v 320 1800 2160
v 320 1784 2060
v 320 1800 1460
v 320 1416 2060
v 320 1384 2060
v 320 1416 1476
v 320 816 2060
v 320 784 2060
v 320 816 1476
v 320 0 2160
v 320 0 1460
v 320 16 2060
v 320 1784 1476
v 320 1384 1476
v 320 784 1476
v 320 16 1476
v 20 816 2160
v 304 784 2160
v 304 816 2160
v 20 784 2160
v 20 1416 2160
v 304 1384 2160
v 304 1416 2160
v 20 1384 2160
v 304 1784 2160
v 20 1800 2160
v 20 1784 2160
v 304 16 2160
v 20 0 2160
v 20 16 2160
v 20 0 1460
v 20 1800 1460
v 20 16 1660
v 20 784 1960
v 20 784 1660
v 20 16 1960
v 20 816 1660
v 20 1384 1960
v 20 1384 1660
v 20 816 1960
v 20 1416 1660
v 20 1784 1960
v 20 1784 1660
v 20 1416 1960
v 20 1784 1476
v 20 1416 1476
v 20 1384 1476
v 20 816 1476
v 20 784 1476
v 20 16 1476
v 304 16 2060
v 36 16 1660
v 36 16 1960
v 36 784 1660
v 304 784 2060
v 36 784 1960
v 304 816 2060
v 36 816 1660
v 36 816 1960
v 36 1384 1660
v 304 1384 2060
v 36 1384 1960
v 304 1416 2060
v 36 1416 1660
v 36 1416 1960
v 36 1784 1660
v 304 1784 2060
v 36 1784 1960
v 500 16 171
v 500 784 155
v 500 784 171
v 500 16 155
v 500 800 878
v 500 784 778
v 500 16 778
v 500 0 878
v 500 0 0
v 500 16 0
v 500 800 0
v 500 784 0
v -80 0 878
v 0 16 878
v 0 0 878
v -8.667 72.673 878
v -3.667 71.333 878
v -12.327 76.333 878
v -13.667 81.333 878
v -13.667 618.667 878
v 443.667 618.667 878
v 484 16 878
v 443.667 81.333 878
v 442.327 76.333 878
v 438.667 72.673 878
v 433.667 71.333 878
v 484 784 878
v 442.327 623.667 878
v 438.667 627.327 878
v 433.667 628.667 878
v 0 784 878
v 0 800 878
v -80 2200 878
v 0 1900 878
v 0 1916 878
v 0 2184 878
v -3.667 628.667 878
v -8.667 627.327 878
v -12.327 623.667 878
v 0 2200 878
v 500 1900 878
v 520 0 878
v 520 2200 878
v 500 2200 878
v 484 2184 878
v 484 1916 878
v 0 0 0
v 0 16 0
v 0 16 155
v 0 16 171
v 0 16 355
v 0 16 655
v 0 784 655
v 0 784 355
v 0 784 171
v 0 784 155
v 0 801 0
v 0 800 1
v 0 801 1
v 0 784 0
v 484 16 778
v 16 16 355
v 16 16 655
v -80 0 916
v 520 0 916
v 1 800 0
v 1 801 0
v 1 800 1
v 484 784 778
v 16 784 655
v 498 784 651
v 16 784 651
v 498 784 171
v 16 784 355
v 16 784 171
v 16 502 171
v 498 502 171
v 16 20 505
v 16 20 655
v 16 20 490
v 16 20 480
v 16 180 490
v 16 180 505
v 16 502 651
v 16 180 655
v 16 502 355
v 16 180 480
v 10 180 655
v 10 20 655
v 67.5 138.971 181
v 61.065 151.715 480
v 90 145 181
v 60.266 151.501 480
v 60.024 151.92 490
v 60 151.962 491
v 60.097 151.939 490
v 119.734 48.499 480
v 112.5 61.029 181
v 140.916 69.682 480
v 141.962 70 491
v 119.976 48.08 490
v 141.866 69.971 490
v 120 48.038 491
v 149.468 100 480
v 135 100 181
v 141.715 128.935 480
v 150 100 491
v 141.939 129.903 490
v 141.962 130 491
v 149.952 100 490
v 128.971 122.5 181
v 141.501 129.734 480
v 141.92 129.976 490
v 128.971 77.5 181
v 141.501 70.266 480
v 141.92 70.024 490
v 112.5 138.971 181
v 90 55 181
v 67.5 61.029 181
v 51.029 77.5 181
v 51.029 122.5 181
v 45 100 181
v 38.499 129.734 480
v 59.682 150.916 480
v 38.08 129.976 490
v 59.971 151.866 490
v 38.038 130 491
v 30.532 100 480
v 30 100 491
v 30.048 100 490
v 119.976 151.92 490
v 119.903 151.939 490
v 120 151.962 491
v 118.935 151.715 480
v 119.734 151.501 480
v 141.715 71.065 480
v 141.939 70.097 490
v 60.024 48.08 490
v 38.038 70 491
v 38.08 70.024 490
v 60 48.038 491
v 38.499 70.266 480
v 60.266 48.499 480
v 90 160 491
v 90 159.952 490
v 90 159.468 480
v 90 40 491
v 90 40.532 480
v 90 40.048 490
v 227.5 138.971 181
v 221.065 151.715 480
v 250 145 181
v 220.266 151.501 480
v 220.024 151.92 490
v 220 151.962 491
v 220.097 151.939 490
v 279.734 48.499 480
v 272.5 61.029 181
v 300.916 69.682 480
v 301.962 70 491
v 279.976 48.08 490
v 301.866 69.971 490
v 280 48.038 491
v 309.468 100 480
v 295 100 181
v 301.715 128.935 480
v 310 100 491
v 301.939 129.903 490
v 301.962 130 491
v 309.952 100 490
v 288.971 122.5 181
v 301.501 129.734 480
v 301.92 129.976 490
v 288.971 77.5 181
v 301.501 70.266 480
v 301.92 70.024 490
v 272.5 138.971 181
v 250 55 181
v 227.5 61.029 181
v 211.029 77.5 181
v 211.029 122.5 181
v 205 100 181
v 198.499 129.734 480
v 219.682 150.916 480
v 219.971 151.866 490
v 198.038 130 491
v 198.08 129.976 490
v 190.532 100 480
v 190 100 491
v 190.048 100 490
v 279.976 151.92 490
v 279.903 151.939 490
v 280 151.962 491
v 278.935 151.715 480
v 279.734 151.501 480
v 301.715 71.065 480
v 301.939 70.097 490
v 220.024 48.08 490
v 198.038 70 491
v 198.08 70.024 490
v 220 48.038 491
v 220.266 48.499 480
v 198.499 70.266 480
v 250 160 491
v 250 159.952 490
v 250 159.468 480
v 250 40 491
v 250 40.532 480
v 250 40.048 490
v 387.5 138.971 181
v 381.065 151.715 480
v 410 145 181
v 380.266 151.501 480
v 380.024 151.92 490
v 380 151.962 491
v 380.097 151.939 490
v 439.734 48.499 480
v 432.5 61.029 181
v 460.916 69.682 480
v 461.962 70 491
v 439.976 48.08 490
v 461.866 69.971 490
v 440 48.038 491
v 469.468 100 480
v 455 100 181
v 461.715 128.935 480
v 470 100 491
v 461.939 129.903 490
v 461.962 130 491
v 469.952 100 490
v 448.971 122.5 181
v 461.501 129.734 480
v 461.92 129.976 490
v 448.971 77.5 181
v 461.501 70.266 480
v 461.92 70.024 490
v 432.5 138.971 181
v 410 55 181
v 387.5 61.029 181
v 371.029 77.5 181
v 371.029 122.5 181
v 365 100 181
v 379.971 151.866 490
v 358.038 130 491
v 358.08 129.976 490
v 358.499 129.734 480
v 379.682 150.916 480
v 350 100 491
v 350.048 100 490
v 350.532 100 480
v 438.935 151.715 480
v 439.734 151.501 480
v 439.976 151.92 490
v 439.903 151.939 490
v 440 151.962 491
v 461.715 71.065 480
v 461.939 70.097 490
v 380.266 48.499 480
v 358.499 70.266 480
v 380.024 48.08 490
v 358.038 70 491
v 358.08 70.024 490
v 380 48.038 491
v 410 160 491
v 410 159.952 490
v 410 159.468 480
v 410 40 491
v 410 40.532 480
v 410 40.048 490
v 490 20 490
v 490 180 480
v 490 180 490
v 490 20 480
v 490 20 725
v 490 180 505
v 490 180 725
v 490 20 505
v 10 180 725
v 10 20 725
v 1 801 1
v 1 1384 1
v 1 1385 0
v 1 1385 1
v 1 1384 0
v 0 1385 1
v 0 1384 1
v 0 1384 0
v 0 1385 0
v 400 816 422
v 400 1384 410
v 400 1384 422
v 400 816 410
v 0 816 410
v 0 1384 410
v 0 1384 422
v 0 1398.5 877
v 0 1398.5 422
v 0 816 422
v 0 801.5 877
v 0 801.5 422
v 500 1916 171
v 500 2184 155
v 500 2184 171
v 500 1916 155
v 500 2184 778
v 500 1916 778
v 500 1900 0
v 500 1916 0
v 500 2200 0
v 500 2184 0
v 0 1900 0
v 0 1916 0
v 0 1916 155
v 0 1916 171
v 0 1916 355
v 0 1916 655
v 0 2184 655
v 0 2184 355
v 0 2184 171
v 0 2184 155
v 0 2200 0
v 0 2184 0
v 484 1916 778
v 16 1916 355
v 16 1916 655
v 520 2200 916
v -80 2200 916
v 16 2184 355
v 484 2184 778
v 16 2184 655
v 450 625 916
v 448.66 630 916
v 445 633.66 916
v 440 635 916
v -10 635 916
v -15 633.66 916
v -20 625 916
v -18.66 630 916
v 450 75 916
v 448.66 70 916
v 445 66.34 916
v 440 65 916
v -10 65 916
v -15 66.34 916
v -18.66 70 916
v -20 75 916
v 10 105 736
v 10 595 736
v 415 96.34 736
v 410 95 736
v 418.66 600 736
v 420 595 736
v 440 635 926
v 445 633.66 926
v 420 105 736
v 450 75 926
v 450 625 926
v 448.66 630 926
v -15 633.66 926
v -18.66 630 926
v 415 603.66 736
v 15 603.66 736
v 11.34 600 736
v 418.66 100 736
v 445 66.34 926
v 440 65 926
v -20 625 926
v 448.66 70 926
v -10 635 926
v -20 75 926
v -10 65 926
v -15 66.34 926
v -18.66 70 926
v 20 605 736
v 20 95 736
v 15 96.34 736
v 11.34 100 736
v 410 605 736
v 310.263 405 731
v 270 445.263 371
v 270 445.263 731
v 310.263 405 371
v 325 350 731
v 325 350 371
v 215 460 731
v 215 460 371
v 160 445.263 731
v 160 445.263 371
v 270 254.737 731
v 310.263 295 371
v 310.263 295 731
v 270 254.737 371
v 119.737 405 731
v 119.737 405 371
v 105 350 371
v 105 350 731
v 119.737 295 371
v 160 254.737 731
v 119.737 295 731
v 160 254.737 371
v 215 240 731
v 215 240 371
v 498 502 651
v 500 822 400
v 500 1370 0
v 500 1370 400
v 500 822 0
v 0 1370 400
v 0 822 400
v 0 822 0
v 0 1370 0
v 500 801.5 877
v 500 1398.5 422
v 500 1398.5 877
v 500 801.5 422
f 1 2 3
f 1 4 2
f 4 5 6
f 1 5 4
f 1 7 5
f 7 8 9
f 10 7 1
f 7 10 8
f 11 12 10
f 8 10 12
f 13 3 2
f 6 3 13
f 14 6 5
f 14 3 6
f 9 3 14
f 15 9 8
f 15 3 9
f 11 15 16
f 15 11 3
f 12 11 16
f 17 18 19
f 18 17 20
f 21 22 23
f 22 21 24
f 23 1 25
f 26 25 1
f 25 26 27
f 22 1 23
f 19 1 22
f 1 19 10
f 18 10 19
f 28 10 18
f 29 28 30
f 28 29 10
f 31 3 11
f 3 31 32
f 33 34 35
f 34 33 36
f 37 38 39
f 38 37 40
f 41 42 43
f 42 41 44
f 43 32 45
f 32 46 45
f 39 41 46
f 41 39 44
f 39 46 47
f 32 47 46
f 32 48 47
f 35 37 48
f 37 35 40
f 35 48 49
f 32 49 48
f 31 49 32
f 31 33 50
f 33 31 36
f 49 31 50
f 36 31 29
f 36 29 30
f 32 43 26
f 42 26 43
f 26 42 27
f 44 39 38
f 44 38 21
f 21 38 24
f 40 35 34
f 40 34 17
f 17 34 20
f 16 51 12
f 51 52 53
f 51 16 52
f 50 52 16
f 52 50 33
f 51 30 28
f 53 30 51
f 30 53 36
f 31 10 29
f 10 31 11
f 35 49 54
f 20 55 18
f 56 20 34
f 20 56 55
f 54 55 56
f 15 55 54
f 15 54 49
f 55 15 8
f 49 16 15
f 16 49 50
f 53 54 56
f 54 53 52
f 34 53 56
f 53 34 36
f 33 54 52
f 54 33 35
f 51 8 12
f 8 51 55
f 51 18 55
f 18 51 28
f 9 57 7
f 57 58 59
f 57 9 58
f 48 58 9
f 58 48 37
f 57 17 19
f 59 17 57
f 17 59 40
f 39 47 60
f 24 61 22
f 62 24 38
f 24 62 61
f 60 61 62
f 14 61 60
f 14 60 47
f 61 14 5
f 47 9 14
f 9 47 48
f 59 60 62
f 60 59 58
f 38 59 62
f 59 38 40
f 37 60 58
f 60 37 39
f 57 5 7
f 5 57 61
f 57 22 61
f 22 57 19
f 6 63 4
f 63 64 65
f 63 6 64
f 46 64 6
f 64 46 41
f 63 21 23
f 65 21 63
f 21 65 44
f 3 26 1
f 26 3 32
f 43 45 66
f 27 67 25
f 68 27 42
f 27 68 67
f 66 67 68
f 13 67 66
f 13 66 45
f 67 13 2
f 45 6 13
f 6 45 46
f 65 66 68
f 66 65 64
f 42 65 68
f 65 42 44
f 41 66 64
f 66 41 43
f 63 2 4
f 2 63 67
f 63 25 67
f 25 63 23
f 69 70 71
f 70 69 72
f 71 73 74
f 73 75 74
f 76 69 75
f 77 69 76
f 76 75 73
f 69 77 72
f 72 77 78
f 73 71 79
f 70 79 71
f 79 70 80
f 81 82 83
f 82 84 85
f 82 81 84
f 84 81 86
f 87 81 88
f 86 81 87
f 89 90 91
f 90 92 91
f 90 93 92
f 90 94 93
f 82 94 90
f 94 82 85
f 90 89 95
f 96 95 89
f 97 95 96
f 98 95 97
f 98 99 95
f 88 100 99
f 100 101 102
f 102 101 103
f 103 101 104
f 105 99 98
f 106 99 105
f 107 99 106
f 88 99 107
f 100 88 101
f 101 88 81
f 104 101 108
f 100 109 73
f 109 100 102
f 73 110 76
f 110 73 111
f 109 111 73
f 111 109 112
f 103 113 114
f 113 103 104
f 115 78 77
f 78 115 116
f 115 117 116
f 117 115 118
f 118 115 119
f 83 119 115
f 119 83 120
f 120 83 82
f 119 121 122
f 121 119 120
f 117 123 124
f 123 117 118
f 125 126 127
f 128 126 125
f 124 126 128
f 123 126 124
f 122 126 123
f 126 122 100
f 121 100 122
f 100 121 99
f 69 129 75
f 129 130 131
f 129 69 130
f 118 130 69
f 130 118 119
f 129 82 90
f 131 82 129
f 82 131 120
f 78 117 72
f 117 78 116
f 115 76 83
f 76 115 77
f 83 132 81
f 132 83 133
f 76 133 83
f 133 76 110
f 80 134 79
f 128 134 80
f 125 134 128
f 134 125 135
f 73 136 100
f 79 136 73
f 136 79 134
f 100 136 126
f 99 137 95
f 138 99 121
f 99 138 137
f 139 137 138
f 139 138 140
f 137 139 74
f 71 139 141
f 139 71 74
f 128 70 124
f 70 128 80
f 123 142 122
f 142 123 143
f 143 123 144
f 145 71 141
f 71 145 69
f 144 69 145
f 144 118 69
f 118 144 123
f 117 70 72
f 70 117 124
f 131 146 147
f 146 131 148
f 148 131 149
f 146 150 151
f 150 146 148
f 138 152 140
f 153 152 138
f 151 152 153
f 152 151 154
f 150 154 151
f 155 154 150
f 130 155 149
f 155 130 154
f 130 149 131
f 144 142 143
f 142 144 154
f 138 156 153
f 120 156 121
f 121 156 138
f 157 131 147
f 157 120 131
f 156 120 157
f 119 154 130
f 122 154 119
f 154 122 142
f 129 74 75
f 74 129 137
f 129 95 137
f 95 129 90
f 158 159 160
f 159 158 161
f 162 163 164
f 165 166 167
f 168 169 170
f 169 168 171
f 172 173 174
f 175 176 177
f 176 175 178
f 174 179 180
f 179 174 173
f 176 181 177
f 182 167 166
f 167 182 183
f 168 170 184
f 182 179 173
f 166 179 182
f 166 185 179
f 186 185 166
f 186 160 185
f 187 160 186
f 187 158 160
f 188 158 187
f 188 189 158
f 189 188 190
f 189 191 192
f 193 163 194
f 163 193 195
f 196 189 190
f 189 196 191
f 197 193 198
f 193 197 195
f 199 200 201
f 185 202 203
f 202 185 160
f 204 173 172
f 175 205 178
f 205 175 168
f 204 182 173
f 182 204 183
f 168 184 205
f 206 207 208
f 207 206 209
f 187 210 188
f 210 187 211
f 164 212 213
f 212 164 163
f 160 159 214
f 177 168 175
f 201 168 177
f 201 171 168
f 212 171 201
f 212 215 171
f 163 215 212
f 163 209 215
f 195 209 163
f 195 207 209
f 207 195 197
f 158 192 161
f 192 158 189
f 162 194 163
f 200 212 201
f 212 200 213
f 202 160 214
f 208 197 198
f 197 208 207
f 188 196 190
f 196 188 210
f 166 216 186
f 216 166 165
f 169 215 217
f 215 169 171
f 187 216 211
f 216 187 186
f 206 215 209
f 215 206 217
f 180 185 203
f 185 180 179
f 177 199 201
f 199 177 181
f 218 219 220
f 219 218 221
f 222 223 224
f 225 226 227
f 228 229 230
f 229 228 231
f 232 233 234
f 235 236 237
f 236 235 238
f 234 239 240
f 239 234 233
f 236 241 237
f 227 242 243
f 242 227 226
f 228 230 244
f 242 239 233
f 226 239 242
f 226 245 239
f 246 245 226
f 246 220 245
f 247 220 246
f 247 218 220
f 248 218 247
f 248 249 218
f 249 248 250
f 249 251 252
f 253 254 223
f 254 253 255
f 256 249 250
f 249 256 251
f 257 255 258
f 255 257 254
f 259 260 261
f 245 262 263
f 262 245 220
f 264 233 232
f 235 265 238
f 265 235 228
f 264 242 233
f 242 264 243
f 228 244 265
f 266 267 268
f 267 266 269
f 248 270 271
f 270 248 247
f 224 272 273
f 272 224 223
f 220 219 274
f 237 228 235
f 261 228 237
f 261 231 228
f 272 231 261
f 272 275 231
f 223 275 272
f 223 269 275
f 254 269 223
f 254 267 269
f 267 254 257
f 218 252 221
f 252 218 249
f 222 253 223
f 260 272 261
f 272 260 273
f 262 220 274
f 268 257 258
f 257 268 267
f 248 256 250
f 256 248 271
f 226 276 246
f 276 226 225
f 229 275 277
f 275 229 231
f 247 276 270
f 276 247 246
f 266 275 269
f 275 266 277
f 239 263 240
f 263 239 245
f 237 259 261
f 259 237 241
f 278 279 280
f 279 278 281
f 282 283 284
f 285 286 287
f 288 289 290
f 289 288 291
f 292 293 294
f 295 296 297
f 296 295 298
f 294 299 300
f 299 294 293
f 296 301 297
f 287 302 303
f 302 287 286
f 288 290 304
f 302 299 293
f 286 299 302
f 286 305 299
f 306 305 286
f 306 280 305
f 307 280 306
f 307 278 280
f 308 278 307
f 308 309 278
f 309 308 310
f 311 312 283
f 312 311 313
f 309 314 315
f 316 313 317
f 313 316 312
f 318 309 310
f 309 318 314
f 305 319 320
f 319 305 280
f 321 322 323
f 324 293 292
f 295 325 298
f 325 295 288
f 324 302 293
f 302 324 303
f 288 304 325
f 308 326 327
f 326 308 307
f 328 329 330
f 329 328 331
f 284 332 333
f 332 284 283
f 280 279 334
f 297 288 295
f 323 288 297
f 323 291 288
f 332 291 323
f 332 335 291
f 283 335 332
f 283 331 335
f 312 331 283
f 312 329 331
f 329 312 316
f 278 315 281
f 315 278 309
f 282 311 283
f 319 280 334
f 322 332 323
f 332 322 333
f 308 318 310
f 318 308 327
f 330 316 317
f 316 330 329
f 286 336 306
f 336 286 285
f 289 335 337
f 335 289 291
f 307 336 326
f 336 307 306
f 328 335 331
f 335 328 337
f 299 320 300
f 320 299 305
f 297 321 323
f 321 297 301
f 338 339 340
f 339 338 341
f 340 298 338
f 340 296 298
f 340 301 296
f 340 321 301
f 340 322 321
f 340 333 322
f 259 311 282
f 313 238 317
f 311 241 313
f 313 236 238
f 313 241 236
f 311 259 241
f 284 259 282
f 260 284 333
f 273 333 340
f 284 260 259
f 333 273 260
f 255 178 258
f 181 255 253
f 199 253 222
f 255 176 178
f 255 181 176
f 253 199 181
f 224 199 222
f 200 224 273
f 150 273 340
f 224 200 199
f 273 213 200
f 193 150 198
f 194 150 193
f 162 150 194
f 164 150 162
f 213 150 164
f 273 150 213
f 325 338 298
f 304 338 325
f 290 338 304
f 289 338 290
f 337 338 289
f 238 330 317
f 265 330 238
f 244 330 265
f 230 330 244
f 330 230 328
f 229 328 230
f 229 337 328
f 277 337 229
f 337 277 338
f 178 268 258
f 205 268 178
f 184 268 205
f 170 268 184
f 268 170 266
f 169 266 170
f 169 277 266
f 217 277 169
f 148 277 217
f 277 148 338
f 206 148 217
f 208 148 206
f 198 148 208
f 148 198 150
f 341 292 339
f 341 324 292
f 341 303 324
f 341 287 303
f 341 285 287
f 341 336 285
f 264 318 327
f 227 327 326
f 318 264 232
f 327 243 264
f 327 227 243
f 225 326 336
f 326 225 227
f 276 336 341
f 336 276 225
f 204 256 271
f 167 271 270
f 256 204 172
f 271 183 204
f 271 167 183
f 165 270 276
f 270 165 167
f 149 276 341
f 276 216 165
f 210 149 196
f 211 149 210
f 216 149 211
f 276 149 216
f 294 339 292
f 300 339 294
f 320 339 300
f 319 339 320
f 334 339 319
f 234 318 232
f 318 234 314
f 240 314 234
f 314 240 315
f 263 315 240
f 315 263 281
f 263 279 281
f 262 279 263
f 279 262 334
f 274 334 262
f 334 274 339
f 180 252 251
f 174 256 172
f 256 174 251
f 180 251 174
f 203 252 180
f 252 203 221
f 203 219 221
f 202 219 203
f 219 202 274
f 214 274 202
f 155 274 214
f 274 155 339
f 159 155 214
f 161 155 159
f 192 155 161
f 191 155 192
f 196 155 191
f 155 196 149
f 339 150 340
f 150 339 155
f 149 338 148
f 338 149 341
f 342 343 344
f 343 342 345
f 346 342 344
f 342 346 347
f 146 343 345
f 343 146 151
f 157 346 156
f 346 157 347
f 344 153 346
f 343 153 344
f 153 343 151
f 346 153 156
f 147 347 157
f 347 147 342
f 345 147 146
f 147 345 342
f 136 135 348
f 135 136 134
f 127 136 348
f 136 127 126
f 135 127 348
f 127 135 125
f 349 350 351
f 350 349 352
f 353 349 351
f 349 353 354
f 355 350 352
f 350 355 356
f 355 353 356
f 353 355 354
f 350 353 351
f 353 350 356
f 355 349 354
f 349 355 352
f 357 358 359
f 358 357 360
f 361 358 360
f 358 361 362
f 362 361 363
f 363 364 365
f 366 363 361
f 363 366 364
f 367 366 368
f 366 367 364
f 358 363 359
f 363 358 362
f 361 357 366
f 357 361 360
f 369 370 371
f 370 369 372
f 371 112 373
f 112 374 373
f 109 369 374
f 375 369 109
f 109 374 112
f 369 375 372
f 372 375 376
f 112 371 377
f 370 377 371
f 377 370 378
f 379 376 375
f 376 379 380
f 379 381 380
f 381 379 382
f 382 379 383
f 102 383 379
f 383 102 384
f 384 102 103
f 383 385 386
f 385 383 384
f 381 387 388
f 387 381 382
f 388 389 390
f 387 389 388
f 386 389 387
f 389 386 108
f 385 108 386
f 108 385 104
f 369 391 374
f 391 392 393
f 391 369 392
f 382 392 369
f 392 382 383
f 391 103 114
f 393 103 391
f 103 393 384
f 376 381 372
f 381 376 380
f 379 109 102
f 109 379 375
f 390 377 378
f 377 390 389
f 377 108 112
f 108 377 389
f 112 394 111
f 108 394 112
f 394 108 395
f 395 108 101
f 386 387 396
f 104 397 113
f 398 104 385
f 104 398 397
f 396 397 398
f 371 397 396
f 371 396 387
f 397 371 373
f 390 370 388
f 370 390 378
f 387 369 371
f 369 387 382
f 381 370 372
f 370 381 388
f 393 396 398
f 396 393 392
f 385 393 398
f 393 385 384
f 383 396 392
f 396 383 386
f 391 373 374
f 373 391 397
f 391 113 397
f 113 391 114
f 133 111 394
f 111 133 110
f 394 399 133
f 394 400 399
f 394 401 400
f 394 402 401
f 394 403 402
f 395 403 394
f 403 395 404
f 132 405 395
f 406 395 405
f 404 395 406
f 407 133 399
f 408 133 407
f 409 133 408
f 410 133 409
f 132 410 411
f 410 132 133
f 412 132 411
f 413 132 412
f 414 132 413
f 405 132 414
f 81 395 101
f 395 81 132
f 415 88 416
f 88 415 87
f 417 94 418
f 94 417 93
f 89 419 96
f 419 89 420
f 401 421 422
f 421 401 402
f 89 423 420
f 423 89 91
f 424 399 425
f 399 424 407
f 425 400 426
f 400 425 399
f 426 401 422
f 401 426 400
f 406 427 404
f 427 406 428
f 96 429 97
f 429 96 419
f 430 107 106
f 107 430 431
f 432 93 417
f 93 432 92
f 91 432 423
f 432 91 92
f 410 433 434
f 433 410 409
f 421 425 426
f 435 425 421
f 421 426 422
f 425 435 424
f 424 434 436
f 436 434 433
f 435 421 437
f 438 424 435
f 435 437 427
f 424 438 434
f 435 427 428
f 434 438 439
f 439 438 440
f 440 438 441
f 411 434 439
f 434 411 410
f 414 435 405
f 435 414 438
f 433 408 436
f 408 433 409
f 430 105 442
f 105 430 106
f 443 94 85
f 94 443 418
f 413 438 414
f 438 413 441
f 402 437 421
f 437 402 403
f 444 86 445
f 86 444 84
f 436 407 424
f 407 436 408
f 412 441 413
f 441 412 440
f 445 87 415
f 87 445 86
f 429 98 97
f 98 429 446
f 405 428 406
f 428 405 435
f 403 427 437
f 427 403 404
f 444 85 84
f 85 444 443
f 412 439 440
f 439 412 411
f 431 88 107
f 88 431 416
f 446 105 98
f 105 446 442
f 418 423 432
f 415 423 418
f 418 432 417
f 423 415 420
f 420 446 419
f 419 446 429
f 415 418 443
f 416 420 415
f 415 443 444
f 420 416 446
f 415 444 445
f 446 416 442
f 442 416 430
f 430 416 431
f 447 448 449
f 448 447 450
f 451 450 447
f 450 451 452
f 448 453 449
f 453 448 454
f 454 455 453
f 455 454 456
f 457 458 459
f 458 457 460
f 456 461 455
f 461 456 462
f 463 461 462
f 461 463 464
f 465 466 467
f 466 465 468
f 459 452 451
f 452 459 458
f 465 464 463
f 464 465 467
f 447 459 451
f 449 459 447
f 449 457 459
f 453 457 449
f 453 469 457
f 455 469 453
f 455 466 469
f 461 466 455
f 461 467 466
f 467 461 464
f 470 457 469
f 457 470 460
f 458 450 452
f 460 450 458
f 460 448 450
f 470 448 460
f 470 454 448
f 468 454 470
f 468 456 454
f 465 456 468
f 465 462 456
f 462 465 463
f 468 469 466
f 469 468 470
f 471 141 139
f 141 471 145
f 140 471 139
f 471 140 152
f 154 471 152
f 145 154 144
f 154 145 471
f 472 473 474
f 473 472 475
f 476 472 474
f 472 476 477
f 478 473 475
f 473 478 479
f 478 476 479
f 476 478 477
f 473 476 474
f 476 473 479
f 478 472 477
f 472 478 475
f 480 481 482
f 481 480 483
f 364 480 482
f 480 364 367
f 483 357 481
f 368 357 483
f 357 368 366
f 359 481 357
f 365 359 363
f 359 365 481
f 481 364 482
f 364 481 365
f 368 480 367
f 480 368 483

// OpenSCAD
kitchen();

module kitchen(){

wall=16;


height=878;
th=38;

deep=500;

W=800+600+500+300;

translate([-80,0,height]) color([0.8,0.8,0.5]) cube([600,W,th]);
xcenter=deep/2-35;
ysinkcenter=800/2-50;

face_h=720;
face_space=3;
level=height-face_h-3;

// sink box
/*
    здесь нужно убедиться, что задняя планка не мешает сегрегатору
    также надо:
     - точнее определиться с положением раковины    
     - более точно определить высоту ниши для духовки
     - подумать над способами уменьшить ширину передних планок. и нужны ли они вообще
     - решить вопрос с гидроаккумулятором
*/
translate([100-80,0,1460]) top_box(w=800, doors=2);
translate([100-80,800,1460]) top_box(w=600, doors=2);
translate([100-80,600+800,1460]) top_box(w=400, doors=1);
kitchen_box();
// sink
$fn=12;
bw=450;
bl=550;
translate([xcenter,ysinkcenter,height-180+th]) color([0.5,0.6,0.8])
hull(){
    for (i=[-1,1]) for (j=[-1,1]){
        translate([(bw/2-30)*i, (bl/2-30)*j,0]) cylinder(h=10, r=10);
        translate([bw/2*i, bl/2*j,180]) cylinder(h=10, r=10);
    }
}
// disposal
translate([xcenter,ysinkcenter,height-180-360+th-5]) color([0.2,0.1,0.1]) cylinder(h=360,r=110);

// bin
binw=282;
translate([wall,800-wall-binw,level+wall]) color([0.3,0.5,0]) cube([482,binw,480]);
/*
translate([500-450,800-wall-binw,level+wall+370]) color([1,0.5,0.2]) cube([450,binw,200]);
translate([500-450,800-wall-130,level+wall+370]) color([1,0.5,0.2]) cube([450,130,250]);
*/

// filter block
color([1,1,1]){
for(i=[-1:1]) translate([500/2+160*i, 100,level+wall+10]) cylinder(h=310,r1=90/2,r2=120/2);
translate([500/2,100,level+wall+310+4])    cube([160*3,160,10], center=true);

translate([500/2,100,level+wall+310+4+220/2+20])    cube([160*3,160,220], center=true);
}

// cook box
translate([0,800,0]) color([0.9,1,1]){
box_walls(600);
translate([0,wall,400+10])cube([400,600-wall*2,wall]); 
}
translate([0,800+wall+6]) color([1,1,1]) cube([deep,600-wall*2-20,400]); // dishwasher
// oven
translate([0,800+face_space/2, 400+wall+6]) cube([deep, 600-face_space, 455]);

// right box
translate([0,800+600+500,0]) {
    kitchen_box(w=300, doors=1);
}
// =====================

module kitchen_box(w=800, doors=2, deep=500){
    box_walls(w, deep, height);
    translate([0,wall,level])cube([deep,w-wall*2,wall]);    // bottom
    translate([0,wall,level+200])cube([wall,w-wall*2,300]);
    translate([500-wall,wall,height-100])cube([wall,w-wall*2,100]);
    
    if (doors==1){
        %translate([500,face_space/2,height-face_h-face_space])cube([20,w-face_space,face_h]);
    }
    else {
        %translate([500,face_space/2,height-face_h-face_space])cube([20,w/2-face_space,face_h]);
        %translate([500,face_space/2+w/2,height-face_h-face_space])cube([20,w/2-face_space,face_h]);
    }
}

module top_box(w=800, doors=2){
    deep=300;
    level=0;
    height=700;
    box_walls(w, 300, height);
    translate([0,wall,level])cube([deep,w-wall*2,wall]);    // bottom
    translate([0,wall,level+200])cube([wall,w-wall*2,300]);
    translate([deep-wall,wall,height-100])cube([wall,w-wall*2,100]);
    
    if (doors==1){
        %translate([deep,face_space/2,height-face_h-face_space])cube([20,w-face_space,face_h]);
    }
    else {
        %translate([deep,face_space/2,height-face_h-face_space])cube([20,w/2-face_space,face_h]);
        %translate([deep,face_space/2+w/2,height-face_h-face_space])cube([20,w/2-face_space,face_h]);
    }
}

module box_walls(w, deep, height){
    cube([deep,wall,height]);
    translate([0,w-wall,0])cube([deep,wall,height]);    
}

}
